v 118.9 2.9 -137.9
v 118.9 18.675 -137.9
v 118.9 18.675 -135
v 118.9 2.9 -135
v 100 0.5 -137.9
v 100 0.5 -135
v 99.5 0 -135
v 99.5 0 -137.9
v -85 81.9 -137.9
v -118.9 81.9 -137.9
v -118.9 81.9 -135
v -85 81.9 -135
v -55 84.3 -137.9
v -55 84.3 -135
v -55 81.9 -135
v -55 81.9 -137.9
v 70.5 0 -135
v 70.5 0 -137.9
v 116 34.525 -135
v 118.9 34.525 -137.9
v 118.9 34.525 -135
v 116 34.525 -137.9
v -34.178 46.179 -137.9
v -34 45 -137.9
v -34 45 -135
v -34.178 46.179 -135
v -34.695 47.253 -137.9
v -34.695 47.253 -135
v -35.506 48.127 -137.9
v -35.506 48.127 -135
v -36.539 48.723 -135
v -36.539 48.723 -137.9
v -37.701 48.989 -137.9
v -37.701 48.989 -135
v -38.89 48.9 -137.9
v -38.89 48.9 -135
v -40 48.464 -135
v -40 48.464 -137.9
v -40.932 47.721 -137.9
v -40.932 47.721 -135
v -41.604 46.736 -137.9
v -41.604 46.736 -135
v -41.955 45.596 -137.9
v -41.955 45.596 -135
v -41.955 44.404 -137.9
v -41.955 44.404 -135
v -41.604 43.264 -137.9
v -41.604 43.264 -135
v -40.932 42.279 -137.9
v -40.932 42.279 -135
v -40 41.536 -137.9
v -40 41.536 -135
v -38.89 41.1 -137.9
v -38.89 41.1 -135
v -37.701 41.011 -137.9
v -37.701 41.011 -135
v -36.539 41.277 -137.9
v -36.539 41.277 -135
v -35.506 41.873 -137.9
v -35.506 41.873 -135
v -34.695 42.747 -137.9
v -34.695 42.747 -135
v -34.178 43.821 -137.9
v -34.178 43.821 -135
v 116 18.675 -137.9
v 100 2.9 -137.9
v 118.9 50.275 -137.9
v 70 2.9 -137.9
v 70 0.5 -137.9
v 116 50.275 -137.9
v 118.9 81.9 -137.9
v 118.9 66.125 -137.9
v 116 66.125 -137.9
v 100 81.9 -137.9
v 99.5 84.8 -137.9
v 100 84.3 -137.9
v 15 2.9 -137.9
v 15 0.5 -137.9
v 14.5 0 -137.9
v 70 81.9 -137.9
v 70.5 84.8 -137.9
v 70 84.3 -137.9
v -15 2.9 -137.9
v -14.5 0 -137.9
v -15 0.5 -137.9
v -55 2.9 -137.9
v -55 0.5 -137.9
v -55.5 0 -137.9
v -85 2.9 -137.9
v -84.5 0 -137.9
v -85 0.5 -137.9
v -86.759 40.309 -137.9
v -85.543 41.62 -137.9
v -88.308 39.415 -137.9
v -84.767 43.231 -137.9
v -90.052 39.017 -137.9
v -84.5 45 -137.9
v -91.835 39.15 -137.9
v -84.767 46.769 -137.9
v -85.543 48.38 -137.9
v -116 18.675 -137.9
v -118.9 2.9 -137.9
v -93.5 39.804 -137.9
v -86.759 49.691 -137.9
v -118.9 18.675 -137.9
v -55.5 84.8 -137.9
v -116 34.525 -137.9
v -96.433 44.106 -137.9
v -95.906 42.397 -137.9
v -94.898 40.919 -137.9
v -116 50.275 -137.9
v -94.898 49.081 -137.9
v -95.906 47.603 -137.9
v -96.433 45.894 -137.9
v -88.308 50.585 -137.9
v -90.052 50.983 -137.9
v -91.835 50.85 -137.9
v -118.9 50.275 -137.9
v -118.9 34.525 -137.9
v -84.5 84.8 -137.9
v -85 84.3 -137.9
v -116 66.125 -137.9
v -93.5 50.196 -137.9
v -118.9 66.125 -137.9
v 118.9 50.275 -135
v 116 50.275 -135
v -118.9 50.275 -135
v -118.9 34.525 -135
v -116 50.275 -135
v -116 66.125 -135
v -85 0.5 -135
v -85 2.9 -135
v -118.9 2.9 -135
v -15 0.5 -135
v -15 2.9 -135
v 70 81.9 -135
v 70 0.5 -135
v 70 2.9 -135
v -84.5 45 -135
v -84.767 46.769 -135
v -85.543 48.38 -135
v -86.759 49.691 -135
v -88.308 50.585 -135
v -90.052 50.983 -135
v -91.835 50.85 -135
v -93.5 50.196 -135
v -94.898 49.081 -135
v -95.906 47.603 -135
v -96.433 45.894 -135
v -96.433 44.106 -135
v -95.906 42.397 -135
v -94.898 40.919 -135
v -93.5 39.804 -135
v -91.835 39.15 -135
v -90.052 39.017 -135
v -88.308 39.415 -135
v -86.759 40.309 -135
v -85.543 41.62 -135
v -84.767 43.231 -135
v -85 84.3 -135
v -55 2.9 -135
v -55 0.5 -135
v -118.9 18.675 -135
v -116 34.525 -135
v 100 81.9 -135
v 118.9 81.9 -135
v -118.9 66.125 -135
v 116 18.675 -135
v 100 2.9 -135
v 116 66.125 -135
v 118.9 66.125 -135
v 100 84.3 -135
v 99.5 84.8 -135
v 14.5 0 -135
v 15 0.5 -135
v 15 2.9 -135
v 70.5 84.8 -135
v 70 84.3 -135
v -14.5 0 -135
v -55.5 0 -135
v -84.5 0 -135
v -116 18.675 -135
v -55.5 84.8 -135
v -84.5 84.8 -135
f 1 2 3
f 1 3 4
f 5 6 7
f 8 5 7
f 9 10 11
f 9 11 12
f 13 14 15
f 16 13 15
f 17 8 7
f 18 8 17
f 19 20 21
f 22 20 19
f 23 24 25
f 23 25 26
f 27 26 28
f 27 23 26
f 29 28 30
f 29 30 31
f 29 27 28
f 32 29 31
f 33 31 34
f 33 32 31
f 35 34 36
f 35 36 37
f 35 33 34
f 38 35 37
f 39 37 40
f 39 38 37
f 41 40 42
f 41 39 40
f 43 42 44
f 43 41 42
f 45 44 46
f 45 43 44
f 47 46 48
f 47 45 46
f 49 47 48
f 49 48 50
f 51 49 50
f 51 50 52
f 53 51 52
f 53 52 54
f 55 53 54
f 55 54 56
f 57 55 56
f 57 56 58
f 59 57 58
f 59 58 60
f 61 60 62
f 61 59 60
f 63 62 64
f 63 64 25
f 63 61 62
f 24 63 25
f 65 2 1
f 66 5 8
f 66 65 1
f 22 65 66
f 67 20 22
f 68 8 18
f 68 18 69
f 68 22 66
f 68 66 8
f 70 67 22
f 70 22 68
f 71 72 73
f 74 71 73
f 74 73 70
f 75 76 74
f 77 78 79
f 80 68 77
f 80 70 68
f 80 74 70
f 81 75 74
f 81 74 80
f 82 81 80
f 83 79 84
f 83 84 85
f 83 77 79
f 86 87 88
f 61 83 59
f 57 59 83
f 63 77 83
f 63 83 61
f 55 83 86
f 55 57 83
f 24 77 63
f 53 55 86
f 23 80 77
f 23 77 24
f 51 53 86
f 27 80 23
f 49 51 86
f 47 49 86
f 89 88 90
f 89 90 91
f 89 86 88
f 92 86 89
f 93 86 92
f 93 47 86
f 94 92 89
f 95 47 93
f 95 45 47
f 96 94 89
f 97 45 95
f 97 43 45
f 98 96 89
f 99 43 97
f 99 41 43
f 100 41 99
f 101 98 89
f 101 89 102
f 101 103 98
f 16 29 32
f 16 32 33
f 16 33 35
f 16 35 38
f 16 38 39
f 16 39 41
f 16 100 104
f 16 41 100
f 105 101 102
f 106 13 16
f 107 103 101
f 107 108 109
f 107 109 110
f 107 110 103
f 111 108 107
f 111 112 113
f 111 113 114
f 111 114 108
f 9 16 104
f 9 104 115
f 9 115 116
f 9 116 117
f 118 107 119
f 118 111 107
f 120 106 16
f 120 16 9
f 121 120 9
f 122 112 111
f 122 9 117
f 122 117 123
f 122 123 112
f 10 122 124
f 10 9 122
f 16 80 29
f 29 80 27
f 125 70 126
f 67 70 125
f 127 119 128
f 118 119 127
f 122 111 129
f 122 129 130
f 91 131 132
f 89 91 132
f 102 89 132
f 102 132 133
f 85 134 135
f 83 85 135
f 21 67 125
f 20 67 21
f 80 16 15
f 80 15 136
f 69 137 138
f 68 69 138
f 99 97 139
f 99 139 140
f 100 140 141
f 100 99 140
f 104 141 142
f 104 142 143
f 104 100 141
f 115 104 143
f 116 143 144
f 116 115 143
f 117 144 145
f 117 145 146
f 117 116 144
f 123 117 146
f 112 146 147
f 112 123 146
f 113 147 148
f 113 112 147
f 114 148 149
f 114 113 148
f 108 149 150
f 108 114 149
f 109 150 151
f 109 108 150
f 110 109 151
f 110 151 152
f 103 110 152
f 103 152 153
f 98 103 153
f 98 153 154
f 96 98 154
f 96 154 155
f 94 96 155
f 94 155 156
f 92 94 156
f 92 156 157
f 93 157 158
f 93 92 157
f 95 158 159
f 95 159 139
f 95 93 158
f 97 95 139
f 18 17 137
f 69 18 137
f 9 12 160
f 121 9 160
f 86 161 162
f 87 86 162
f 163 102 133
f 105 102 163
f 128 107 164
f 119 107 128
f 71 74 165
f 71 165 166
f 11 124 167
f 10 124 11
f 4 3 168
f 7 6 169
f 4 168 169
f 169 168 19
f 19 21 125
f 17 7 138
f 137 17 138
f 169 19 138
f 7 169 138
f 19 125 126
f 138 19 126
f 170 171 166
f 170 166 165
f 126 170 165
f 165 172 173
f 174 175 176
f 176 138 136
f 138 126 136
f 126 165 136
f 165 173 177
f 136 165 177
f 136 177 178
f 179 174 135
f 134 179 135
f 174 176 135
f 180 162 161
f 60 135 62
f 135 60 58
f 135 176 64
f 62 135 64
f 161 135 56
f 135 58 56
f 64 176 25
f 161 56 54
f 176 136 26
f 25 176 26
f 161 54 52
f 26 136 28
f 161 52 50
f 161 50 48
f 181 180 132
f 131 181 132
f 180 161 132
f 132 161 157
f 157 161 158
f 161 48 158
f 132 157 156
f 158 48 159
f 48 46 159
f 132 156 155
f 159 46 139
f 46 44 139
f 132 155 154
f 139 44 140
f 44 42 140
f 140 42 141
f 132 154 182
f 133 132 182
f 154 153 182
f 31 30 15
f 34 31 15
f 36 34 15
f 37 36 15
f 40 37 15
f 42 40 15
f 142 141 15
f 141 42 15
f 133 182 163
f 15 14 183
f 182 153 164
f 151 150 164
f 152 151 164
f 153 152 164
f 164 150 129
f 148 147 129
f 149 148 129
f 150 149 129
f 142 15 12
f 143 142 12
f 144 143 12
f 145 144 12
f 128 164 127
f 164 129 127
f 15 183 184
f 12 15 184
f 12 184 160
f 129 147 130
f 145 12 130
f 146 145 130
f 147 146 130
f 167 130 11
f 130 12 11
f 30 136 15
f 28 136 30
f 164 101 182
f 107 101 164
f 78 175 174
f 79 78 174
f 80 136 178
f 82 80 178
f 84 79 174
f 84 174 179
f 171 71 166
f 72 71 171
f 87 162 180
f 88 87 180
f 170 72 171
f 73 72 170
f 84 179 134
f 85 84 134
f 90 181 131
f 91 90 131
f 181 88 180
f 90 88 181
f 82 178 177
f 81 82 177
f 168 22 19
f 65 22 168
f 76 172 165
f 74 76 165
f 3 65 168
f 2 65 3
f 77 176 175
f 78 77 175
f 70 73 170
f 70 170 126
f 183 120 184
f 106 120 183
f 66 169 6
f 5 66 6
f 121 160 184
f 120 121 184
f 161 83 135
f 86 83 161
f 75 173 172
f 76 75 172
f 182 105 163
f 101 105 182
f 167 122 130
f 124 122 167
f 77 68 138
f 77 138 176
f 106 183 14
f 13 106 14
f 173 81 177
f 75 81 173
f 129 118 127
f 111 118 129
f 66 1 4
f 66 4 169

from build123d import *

# Parameters (mm, degrees)
SKETCH1_R           = 6
SKETCH1_R_2         = 4
BOSS_EXTRUDE1_DEPTH = 2.9


with BuildPart() as part:
    # Sketch1 → Boss-Extrude1 (new body)
    with BuildSketch(Plane.XY.offset(-137.9)):
        Polygon((118.9, 2.9), (100, 2.9), (100, 0.5), (99.5, 0), (70.5, 0), (70, 0.5), (70, 2.9), (15, 2.9), (15, 0.5), (14.5, 0), (-14.5, 0), (-15, 0.5), (-15, 2.9), (-55, 2.9), (-55, 0.5), (-55.5, 0), (-84.5, 0), (-85, 0.5), (-85, 2.9), (-118.9, 2.9), (-118.9, 18.675), (-116, 18.675), (-116, 34.525), (-118.9, 34.525), (-118.9, 50.275), (-116, 50.275), (-116, 66.125), (-118.9, 66.125), (-118.9, 81.9), (-85, 81.9), (-85, 84.3), (-84.5, 84.8), (-55.5, 84.8), (-55, 84.3), (-55, 81.9), (70, 81.9), (70, 84.3), (70.5, 84.8), (99.5, 84.8), (100, 84.3), (100, 81.9), (118.9, 81.9), (118.9, 66.125), (116, 66.125), (116, 50.275), (118.9, 50.275), (118.9, 34.525), (116, 34.525), (116, 18.675), (118.9, 18.675), align=None)
        with Locations((-90.5, 45)):
            Circle(SKETCH1_R, mode=Mode.SUBTRACT)
        with Locations((-38, 45)):
            Circle(SKETCH1_R_2, mode=Mode.SUBTRACT)
    extrude(amount=BOSS_EXTRUDE1_DEPTH)


solid = part.part
